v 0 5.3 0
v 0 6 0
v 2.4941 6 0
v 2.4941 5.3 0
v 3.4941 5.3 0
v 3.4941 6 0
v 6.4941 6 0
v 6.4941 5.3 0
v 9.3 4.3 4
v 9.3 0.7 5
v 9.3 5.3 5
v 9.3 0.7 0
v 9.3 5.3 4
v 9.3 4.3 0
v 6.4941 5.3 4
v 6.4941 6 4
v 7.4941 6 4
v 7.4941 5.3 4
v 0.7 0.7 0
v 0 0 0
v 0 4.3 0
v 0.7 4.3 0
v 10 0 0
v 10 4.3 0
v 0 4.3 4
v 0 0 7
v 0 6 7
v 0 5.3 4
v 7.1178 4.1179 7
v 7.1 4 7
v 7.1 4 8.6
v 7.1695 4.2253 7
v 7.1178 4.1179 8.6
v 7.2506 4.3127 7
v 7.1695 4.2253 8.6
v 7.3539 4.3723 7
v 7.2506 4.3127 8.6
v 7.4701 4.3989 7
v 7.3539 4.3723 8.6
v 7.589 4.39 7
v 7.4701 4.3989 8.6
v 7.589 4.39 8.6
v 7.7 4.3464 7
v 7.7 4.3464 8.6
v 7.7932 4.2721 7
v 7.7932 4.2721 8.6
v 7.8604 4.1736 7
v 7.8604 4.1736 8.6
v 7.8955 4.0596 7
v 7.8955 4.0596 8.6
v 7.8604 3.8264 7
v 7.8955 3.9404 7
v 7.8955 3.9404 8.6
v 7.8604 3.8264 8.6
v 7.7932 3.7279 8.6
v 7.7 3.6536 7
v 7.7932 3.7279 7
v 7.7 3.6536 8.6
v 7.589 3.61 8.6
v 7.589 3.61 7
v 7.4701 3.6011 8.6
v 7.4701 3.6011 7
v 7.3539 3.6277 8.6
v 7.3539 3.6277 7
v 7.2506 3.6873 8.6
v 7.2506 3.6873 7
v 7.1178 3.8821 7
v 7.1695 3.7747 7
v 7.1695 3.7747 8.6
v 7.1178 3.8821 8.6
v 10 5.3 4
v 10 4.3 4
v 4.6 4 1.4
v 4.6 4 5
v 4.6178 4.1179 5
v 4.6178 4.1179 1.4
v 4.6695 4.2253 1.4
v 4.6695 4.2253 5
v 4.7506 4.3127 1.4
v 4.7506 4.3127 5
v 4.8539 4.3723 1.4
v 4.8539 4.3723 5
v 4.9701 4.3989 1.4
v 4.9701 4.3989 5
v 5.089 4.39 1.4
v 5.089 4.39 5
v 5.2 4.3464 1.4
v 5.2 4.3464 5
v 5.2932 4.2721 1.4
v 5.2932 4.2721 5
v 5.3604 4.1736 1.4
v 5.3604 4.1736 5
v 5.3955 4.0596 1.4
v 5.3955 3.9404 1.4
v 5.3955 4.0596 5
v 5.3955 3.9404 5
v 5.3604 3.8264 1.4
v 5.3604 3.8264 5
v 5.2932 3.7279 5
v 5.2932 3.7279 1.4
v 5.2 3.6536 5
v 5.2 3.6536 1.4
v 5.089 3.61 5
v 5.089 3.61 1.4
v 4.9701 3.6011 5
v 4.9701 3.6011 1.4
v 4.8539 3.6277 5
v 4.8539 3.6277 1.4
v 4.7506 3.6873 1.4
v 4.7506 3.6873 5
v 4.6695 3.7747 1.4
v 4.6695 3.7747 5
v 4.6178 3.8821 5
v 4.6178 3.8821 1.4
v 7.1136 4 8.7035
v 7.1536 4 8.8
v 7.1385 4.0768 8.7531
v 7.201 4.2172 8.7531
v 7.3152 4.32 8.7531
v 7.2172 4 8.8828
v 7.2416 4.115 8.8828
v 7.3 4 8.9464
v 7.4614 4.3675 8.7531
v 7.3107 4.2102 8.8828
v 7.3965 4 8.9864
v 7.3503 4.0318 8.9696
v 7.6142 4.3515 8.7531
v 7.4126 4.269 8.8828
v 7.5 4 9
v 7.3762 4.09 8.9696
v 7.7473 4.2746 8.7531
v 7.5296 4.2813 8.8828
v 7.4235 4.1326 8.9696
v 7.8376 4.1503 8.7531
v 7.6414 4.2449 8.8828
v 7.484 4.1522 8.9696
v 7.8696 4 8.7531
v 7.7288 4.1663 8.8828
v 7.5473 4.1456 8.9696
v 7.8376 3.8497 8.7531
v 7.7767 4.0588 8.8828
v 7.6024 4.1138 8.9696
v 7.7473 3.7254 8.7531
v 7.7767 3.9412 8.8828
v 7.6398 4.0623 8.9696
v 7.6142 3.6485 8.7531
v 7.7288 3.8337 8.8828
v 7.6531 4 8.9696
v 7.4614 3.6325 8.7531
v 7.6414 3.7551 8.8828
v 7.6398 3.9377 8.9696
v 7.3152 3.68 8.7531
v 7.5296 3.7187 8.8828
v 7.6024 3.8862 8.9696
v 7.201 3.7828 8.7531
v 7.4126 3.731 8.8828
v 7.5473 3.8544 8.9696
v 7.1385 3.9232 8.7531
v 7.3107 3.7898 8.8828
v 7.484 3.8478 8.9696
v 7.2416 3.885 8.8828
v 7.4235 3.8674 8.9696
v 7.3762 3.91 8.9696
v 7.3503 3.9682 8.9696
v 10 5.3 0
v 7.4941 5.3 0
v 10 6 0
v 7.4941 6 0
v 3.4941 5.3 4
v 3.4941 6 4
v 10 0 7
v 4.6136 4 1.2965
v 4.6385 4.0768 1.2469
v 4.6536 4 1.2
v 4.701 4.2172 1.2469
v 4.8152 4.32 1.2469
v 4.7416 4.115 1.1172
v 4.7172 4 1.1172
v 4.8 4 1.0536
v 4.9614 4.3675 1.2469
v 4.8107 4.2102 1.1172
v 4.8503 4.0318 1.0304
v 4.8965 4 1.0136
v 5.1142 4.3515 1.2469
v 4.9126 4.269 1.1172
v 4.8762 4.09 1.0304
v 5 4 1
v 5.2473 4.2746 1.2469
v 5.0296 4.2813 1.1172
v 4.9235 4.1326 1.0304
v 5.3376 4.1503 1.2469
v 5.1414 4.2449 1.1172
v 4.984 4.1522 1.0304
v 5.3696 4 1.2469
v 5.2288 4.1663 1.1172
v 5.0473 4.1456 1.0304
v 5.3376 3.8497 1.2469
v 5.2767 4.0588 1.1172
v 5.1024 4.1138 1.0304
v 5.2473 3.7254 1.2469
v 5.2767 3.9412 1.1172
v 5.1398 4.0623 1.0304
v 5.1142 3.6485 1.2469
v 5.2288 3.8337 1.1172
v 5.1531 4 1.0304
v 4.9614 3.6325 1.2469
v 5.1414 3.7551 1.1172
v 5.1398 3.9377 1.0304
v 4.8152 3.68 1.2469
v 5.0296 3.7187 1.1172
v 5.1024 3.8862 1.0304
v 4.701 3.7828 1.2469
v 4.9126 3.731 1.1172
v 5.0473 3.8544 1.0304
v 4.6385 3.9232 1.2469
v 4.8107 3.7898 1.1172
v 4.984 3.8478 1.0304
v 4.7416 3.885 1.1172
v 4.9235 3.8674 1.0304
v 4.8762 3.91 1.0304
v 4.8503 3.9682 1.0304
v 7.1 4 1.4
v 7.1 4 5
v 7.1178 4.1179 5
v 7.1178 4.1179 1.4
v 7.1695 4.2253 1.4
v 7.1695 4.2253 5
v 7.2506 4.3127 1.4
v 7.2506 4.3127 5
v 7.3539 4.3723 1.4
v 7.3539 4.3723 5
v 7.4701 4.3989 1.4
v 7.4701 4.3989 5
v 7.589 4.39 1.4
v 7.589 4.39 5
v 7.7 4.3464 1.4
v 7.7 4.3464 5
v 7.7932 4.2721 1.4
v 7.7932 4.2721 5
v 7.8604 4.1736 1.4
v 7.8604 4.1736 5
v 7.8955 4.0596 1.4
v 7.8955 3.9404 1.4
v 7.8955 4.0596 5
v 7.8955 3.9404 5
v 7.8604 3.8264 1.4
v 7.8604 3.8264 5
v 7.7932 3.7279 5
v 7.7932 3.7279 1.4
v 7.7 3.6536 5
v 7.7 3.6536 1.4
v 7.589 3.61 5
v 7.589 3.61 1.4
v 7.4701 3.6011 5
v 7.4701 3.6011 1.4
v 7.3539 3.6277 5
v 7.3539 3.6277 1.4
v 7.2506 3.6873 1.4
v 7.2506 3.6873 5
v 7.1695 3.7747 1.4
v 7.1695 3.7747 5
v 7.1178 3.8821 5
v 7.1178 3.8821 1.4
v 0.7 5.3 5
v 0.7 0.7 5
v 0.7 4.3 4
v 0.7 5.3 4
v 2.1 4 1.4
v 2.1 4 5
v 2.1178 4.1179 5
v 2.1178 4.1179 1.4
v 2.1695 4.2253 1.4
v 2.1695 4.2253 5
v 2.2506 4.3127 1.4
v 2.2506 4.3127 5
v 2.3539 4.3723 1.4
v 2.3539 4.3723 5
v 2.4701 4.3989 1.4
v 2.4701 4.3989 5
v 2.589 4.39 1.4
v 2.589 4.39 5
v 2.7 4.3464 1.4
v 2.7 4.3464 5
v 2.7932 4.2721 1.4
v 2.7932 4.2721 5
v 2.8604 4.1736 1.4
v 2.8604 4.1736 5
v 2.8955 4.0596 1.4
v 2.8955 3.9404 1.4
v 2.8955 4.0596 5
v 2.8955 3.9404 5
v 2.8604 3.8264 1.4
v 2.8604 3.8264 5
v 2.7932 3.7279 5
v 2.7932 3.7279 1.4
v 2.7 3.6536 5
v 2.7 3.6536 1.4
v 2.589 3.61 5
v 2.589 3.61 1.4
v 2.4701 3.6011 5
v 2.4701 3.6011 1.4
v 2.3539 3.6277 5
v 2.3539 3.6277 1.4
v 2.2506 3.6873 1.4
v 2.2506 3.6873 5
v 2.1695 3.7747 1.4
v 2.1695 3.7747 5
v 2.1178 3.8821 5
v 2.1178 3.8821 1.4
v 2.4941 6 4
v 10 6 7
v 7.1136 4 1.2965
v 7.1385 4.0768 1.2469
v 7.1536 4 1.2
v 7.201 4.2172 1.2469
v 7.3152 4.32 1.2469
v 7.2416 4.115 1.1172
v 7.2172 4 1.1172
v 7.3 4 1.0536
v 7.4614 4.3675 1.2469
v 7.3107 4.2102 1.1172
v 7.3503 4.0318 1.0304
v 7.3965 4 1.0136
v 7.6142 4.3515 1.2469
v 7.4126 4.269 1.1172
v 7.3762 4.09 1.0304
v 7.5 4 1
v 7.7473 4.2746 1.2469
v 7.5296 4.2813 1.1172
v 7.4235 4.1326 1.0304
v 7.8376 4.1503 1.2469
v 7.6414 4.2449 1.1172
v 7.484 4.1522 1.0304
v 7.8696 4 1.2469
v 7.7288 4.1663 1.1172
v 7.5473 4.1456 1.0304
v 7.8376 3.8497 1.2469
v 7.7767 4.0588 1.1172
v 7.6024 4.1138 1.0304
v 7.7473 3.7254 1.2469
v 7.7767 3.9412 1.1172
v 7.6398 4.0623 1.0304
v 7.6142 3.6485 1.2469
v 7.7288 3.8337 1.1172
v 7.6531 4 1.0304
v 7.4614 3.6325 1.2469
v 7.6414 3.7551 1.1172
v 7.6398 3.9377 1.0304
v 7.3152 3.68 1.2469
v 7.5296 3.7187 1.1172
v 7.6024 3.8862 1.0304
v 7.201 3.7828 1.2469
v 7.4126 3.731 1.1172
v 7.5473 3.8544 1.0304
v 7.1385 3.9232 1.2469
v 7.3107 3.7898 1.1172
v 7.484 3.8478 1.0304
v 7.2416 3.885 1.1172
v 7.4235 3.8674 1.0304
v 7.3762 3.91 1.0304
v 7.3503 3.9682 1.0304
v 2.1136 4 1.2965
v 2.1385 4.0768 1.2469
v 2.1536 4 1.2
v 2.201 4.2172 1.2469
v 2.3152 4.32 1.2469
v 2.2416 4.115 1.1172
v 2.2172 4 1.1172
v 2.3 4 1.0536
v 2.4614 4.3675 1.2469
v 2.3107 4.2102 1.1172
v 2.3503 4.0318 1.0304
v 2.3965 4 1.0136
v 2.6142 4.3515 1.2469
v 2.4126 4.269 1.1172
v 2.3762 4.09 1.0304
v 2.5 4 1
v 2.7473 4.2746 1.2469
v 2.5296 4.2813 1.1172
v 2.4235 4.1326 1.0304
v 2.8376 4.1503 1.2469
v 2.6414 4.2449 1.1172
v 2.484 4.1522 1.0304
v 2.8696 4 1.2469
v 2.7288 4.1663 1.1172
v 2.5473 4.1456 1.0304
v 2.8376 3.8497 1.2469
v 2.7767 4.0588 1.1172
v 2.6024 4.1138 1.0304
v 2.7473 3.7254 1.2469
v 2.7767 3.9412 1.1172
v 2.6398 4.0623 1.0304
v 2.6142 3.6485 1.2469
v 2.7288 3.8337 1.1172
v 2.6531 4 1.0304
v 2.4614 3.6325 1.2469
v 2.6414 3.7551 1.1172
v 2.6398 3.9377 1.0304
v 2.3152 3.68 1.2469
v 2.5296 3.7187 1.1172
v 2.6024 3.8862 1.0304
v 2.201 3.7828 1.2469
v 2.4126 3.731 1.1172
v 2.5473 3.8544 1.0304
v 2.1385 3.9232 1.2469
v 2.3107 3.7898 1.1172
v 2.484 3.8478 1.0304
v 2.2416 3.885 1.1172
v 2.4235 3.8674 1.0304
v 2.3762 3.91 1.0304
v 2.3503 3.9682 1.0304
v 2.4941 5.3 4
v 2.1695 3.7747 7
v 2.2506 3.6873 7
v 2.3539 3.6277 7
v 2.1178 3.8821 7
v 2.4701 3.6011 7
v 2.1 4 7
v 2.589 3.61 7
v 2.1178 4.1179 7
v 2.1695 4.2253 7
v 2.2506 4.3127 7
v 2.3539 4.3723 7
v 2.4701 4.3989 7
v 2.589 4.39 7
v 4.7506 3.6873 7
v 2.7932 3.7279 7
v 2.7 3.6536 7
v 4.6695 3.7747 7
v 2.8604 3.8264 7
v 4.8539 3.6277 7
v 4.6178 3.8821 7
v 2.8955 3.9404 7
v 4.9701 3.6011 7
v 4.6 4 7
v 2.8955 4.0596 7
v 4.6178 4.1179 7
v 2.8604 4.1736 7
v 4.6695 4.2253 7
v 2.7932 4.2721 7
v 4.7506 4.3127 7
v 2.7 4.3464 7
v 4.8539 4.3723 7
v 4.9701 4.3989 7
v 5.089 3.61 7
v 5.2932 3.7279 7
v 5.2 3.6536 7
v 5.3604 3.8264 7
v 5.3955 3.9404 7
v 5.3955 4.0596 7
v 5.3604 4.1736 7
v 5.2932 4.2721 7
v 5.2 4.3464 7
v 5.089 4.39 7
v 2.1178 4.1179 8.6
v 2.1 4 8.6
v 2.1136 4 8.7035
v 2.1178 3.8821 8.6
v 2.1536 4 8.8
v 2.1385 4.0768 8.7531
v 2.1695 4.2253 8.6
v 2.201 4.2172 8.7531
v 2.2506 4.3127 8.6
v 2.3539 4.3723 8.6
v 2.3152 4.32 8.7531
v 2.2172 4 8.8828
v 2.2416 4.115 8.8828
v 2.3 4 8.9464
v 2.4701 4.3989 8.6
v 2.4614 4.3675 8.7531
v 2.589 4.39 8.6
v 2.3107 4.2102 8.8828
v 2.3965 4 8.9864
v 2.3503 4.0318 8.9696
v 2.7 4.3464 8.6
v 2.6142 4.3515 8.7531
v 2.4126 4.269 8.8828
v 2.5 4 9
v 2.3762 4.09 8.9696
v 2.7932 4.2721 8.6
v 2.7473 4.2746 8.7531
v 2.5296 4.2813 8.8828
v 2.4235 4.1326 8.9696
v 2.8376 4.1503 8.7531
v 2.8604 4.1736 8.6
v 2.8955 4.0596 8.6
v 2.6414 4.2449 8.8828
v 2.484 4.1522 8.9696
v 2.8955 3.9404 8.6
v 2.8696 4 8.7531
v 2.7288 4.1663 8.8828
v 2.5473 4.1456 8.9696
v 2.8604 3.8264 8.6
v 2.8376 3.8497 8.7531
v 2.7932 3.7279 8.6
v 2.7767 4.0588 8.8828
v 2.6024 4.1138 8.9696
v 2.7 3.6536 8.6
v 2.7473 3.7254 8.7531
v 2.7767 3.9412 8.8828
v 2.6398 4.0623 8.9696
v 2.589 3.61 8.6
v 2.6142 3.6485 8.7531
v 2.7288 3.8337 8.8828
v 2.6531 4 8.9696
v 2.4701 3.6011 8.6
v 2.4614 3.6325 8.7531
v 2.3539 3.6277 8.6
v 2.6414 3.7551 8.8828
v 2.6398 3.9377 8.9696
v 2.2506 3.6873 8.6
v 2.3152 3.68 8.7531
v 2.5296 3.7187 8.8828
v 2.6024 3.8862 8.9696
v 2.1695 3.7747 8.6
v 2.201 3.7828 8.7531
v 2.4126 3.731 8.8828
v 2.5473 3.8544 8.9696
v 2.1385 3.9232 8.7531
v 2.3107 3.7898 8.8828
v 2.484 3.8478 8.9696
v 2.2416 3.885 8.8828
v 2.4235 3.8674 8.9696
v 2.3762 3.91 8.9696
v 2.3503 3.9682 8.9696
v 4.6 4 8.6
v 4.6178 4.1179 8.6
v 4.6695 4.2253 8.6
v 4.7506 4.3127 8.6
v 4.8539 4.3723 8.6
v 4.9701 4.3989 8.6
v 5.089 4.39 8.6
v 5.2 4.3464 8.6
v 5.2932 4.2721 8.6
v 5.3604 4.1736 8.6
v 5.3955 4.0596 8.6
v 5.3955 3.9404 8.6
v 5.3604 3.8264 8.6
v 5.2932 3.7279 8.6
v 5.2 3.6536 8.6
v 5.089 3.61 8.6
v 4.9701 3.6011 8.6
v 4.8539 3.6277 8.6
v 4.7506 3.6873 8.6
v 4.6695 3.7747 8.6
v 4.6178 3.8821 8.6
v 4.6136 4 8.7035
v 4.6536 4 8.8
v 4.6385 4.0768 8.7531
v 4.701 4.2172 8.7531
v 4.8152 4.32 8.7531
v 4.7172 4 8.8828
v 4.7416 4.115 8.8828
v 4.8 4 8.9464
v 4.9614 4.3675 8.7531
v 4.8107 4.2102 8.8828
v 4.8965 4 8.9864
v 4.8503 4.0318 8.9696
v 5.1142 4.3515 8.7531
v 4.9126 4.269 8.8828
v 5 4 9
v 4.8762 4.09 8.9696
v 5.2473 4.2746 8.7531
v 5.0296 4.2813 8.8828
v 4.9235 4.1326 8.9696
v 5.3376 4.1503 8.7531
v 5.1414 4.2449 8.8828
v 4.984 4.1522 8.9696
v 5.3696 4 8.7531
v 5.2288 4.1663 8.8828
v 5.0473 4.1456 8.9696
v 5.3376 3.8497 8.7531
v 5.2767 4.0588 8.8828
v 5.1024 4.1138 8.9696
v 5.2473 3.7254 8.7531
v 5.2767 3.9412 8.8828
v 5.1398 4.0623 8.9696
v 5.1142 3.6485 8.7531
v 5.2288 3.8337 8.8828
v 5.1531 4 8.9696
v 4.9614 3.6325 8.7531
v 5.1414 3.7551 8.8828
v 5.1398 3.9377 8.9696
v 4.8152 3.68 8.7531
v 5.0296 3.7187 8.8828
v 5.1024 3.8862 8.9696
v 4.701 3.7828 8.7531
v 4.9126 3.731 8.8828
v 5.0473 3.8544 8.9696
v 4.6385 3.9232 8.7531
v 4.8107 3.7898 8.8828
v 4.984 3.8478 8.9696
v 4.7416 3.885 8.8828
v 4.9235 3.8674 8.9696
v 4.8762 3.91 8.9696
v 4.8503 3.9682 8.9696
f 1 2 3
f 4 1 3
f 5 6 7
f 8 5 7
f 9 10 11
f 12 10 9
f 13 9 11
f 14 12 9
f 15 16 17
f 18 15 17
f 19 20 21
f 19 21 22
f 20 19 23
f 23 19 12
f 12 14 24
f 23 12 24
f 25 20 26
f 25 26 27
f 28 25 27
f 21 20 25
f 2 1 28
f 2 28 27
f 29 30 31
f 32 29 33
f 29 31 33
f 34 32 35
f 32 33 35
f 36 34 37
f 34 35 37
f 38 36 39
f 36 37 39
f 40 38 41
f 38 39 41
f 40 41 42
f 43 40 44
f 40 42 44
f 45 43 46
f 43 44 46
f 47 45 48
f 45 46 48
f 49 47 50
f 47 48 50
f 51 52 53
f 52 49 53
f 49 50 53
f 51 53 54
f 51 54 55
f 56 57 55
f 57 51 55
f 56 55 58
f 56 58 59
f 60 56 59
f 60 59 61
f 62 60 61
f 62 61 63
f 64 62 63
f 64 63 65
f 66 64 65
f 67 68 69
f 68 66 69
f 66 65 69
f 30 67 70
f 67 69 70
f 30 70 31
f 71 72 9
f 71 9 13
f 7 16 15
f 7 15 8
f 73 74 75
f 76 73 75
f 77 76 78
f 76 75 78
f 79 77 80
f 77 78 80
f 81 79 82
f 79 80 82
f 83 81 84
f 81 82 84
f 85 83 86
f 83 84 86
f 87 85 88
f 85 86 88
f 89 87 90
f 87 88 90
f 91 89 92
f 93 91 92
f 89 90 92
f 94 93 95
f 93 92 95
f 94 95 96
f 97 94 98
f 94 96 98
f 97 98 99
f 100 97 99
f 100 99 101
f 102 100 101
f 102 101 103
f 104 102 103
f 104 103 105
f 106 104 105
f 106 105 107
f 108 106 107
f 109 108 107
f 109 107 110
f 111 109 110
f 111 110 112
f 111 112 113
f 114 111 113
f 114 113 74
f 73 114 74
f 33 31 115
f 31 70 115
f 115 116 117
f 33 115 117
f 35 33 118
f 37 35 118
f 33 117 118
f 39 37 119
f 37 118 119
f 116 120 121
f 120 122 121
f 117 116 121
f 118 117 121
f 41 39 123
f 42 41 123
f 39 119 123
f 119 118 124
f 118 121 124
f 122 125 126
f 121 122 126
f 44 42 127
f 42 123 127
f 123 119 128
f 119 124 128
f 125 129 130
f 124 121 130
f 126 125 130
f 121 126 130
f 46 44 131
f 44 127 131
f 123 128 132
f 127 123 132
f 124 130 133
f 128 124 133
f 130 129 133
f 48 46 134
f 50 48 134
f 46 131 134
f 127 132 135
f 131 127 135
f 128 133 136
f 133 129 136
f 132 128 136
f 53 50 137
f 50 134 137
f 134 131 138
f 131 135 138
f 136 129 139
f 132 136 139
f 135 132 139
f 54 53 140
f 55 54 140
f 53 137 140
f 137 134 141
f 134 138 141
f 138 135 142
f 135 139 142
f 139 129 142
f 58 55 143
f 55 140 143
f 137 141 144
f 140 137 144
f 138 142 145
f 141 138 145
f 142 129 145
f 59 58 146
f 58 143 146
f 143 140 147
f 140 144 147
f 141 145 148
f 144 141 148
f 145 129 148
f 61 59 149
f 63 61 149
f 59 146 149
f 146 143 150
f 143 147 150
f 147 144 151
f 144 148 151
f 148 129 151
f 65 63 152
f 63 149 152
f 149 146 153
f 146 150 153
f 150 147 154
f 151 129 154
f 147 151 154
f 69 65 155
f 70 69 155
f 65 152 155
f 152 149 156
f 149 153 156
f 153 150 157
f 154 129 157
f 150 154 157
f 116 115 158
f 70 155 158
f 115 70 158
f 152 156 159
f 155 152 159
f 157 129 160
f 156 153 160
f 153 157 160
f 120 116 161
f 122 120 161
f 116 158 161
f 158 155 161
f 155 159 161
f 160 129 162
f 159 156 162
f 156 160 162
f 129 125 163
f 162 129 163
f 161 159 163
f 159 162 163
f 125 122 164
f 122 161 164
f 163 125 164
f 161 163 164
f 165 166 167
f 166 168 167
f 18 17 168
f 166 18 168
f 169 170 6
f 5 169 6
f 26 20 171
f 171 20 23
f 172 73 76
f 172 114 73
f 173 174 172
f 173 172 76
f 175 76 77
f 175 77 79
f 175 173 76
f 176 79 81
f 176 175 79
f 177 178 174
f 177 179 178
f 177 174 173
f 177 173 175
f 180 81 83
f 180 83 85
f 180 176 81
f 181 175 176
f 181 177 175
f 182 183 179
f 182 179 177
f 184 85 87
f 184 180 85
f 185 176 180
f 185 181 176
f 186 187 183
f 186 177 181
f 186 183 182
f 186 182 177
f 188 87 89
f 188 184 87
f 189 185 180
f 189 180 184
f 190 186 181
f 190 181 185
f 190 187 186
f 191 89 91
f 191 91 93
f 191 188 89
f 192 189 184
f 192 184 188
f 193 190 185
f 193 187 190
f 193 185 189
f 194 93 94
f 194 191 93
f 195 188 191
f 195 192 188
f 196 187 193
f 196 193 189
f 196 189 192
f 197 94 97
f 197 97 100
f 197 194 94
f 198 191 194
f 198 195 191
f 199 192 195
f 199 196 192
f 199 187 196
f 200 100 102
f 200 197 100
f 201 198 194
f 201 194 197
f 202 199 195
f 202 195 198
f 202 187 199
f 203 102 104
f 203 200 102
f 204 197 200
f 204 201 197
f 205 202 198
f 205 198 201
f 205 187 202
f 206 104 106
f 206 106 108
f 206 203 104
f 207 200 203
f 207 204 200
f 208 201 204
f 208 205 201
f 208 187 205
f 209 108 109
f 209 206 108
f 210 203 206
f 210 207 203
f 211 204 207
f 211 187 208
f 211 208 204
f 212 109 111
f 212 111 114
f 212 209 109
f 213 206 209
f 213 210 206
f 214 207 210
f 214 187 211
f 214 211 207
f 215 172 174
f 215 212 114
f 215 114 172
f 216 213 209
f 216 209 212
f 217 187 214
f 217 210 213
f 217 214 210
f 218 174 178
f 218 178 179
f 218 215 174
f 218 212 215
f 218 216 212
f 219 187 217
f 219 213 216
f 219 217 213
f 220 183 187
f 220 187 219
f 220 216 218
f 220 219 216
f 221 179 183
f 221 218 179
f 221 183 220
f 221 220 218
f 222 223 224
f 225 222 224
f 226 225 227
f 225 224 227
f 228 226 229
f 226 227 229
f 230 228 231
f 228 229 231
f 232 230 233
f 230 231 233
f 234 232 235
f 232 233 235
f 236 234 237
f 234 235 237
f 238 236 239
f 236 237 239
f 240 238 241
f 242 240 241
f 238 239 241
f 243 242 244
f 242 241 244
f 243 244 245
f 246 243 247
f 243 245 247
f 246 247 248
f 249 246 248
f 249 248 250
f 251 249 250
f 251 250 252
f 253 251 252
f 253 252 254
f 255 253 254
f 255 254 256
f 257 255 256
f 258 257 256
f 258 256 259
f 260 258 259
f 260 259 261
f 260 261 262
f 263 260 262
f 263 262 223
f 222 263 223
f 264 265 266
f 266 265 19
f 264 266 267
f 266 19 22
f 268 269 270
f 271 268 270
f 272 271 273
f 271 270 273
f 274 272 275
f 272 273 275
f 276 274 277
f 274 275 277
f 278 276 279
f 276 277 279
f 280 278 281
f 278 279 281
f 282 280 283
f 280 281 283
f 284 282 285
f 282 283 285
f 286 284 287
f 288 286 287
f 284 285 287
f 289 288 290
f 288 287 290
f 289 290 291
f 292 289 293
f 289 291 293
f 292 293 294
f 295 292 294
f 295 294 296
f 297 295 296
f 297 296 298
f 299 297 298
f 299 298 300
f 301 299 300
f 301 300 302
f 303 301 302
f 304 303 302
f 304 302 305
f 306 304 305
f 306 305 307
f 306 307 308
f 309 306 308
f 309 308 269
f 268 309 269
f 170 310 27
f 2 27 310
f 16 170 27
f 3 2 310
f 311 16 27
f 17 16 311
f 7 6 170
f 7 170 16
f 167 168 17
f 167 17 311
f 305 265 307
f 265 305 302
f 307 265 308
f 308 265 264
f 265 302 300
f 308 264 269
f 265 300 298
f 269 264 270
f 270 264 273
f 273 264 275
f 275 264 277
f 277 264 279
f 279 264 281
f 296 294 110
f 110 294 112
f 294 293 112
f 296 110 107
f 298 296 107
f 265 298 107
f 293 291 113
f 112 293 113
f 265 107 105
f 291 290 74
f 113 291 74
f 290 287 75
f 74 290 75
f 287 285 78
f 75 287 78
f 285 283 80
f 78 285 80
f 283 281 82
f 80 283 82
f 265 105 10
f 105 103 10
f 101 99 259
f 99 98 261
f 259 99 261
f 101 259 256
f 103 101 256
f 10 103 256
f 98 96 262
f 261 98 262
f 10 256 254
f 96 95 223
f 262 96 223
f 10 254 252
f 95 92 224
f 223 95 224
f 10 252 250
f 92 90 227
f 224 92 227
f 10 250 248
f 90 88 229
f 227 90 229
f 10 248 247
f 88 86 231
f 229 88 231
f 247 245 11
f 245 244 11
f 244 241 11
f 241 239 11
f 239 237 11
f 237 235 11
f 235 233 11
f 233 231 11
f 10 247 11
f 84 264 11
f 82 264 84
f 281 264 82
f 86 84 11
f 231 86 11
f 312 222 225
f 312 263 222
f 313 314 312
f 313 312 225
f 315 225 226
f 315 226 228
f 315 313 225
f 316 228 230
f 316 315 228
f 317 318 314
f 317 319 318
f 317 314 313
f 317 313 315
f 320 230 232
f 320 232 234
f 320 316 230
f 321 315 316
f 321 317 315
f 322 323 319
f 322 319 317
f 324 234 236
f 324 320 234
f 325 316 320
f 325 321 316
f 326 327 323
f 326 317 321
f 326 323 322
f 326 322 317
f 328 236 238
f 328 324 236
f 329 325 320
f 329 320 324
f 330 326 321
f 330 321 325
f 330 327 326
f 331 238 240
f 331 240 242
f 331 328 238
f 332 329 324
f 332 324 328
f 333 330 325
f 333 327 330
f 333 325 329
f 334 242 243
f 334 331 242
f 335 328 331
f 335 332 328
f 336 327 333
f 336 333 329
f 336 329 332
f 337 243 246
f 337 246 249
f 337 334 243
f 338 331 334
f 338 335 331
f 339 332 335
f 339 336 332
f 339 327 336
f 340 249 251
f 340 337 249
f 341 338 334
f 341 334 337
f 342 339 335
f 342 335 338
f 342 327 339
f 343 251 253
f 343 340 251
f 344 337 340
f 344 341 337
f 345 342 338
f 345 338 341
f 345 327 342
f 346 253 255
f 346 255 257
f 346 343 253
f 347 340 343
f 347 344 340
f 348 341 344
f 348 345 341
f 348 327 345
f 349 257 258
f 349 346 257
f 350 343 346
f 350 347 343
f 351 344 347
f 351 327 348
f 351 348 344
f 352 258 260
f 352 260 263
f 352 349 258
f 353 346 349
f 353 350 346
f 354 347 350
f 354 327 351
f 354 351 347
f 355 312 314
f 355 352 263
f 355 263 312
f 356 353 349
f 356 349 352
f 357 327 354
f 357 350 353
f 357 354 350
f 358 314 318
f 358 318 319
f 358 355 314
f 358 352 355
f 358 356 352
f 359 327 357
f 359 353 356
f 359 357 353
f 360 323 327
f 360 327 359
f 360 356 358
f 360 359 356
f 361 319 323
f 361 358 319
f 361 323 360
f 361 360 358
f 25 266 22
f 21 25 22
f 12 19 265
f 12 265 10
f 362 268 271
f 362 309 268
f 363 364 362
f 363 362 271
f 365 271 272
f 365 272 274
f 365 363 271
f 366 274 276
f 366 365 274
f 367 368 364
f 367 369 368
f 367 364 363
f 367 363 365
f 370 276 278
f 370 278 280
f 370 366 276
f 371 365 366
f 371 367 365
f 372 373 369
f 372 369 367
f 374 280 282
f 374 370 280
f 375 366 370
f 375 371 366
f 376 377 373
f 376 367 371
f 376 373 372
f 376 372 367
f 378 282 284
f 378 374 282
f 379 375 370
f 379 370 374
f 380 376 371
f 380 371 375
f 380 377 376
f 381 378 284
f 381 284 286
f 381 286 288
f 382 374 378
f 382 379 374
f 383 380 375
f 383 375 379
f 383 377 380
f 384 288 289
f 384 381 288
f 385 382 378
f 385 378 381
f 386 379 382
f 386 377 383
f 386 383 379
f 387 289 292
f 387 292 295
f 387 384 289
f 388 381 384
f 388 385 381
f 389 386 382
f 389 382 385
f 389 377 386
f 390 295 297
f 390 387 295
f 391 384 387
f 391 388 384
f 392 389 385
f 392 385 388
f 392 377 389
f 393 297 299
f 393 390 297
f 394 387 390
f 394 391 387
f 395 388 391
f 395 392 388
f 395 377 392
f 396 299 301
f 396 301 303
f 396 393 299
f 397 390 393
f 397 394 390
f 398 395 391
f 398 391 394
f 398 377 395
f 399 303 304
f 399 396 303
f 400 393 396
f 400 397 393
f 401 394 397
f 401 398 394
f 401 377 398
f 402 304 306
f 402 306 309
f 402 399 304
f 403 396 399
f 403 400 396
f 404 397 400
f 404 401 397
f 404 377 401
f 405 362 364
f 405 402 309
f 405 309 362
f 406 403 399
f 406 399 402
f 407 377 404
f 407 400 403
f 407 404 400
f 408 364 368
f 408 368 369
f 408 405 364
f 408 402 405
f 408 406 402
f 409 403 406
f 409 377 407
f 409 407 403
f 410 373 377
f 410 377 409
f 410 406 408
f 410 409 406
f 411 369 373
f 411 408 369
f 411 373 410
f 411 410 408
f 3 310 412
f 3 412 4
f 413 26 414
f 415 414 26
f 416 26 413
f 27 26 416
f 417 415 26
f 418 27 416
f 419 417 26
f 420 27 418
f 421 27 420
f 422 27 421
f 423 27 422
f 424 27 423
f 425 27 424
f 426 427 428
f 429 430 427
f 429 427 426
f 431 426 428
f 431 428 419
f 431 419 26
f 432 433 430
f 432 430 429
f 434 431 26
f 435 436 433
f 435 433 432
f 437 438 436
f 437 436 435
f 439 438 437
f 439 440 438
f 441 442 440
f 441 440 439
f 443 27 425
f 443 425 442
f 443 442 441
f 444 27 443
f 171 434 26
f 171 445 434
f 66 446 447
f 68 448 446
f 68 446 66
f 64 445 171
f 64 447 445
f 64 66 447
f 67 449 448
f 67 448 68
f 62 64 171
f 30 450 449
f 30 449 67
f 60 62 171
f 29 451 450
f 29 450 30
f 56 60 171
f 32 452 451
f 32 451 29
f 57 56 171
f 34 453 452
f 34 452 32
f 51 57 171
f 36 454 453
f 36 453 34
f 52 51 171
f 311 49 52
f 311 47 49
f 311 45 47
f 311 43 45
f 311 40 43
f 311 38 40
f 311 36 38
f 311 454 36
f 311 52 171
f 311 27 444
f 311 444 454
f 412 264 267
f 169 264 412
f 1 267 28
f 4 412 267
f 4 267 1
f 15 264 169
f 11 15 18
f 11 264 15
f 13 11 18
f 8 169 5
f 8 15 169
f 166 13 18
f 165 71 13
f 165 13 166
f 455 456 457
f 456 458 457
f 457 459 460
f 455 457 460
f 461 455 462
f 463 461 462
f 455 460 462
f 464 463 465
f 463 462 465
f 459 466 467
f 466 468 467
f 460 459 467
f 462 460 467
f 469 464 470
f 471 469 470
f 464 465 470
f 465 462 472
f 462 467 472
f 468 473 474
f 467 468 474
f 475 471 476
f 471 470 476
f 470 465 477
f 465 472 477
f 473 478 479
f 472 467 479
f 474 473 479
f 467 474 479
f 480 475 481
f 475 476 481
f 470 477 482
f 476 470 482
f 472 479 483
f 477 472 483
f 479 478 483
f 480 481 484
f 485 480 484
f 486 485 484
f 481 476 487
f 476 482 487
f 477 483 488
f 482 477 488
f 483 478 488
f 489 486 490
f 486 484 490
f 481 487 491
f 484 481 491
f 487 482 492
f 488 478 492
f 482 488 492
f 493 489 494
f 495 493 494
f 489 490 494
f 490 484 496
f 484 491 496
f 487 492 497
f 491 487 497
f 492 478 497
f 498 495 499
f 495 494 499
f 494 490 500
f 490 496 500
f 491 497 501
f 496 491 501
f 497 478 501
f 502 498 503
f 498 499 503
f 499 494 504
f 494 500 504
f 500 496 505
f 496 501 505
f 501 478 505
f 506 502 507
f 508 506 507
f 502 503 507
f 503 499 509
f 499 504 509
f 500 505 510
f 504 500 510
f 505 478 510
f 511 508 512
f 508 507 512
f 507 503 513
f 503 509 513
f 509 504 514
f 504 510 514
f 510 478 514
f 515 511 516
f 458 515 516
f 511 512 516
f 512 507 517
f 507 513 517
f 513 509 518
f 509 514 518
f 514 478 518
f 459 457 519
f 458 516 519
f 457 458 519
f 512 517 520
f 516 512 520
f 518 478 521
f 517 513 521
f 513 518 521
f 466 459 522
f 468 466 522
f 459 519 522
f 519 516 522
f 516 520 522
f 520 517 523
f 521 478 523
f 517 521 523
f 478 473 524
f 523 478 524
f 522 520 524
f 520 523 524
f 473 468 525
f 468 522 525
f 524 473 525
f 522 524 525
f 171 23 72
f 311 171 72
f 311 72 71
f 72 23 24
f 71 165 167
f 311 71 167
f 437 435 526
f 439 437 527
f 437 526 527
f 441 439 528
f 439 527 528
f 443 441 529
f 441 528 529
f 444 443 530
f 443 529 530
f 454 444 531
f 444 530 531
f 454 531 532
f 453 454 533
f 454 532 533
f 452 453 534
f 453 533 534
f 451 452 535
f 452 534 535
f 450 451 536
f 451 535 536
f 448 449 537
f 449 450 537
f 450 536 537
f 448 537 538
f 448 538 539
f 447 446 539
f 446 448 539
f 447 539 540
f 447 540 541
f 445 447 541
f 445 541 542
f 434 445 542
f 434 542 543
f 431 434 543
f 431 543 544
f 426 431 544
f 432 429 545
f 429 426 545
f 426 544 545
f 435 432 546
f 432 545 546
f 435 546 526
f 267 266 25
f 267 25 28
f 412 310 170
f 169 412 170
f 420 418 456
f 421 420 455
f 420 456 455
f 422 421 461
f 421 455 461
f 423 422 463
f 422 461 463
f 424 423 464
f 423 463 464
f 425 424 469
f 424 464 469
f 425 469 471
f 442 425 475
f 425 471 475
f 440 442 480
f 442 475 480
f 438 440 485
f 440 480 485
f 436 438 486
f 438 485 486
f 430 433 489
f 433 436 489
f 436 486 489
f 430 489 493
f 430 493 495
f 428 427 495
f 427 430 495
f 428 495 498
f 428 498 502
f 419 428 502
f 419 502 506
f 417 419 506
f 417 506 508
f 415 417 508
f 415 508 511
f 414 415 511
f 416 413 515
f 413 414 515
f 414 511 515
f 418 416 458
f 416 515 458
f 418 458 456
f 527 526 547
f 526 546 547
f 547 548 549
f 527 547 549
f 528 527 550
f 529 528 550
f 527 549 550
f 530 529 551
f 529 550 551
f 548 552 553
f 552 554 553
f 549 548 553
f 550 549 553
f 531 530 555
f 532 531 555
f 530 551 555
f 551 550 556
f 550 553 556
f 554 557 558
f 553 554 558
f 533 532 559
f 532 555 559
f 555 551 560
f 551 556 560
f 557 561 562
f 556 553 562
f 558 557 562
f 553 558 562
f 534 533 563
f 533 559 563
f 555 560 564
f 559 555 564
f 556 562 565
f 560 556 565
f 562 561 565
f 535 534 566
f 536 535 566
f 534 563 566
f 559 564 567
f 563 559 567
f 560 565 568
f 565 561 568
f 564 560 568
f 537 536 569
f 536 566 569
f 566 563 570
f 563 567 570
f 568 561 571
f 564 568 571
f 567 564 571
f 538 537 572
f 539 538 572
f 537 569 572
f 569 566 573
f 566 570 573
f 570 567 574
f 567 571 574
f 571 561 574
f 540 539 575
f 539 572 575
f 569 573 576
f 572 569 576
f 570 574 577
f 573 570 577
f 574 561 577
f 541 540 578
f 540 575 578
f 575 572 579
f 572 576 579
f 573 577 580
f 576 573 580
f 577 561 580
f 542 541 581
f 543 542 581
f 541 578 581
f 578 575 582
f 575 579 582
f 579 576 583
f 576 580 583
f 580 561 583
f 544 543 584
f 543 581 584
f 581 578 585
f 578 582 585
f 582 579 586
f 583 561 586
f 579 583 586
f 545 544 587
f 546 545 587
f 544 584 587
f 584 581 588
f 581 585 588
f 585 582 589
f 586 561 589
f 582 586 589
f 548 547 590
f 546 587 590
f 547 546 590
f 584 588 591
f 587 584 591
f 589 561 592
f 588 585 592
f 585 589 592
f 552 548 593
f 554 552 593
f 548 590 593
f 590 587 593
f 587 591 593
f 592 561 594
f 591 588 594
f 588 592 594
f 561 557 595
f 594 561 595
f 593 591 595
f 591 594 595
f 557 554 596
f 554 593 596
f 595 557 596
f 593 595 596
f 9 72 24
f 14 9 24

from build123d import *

# Parameters (mm, degrees)
SKETCH_1_W           = 10
SKETCH_1_H           = 6
EXTRUDE_1_DEPTH      = 7
SKETCH_2_W           = 8.6
SKETCH_2_H           = 4.6
CUT_EXTRUDE_1_DEPTH  = 5
CUT_EXTRUDE_2_REACH  = 15.601
SKETCH_3_W           = 1
SKETCH_3_H           = 4
SKETCH_4_W           = 4
SKETCH_4_H           = 1
CUT_EXTRUDE_3_DEPTH  = 14.601470509
EXTRUDE_2_DEPTH      = 4
EXTRUDE_2_DEPTH_BACK = 4
SKETCH_5_R           = 0.4
FILLET_1_R           = 0.4


with BuildPart() as part:
    # 草图1 → 凸台-拉伸1 (new body)
    with BuildSketch(Plane.XY):
        with Locations((5, 3)):
            Rectangle(SKETCH_1_W, SKETCH_1_H)
    extrude(amount=EXTRUDE_1_DEPTH)

    # 草图2 → 切除-拉伸1 (cut)
    with BuildSketch(Plane.XY):
        with Locations((5, 3)):
            Rectangle(SKETCH_2_W, SKETCH_2_H)
    extrude(amount=CUT_EXTRUDE_1_DEPTH, mode=Mode.SUBTRACT)

    # 草图3 → 切除-拉伸2 (cut, up to next)
    with BuildSketch(Plane(origin=(0, 6, 0), x_dir=(1, 0, 0), z_dir=(0, 1, 0)), mode=Mode.PRIVATE) as cut_extrude_2_sk1:
        with Locations((6.99408033, -2)):
            Rectangle(SKETCH_3_W, SKETCH_3_H)
    cut_extrude_2_tool1 = extrude(cut_extrude_2_sk1.sketch, amount=-CUT_EXTRUDE_2_REACH, mode=Mode.PRIVATE) & part.part
    # 草图3 → 切除-拉伸2 (cut, up to next)
    with BuildSketch(Plane(origin=(0, 6, 0), x_dir=(1, 0, 0), z_dir=(0, 1, 0)), mode=Mode.PRIVATE) as cut_extrude_2_sk2:
        with Locations((2.99408033, -2)):
            Rectangle(SKETCH_3_W, SKETCH_3_H)
    cut_extrude_2_tool2 = extrude(cut_extrude_2_sk2.sketch, amount=-CUT_EXTRUDE_2_REACH, mode=Mode.PRIVATE) & part.part
    add(cut_extrude_2_tool1.solids().sort_by_distance((6.99408, 6, 2))[0], mode=Mode.SUBTRACT)
    add(cut_extrude_2_tool2.solids().sort_by_distance((2.99408, 6, 2))[0], mode=Mode.SUBTRACT)

    # 草图4 → 切除-拉伸3 (cut, through all)
    with BuildSketch(Plane(origin=(10, 0, 0), x_dir=(0, 0, -1), z_dir=(1, 0, 0))):
        with Locations((-2, 4.8)):
            Rectangle(SKETCH_4_W, SKETCH_4_H)
    extrude(amount=-CUT_EXTRUDE_3_DEPTH, mode=Mode.SUBTRACT)

    # 草图5 → 凸台-拉伸2 (add, two sides: drawn at the far end of the back side and taken through both)
    with BuildSketch(Plane(origin=(0, 0, 5), x_dir=(-1, 0, 0), z_dir=(0, 0, -1)).offset(-EXTRUDE_2_DEPTH_BACK)):
        with Locations((-5, 4)):
            Circle(SKETCH_5_R)
        with Locations((-7.5, 4)):
            Circle(SKETCH_5_R)
        with Locations((-2.5, 4)):
            Circle(SKETCH_5_R)
    extrude(amount=EXTRUDE_2_DEPTH + EXTRUDE_2_DEPTH_BACK)

    # 圆角1
    fillet_1_edges = [part.edges().sort_by_distance(p)[0] for p in [
        (2.9, 4, 9),
        (2.9, 4, 1),
        (5.4, 4, 9),
        (5.4, 4, 1),
        (7.9, 4, 9),
        (7.9, 4, 1),
    ]]
    fillet(fillet_1_edges, radius=FILLET_1_R)


solid = part.part
